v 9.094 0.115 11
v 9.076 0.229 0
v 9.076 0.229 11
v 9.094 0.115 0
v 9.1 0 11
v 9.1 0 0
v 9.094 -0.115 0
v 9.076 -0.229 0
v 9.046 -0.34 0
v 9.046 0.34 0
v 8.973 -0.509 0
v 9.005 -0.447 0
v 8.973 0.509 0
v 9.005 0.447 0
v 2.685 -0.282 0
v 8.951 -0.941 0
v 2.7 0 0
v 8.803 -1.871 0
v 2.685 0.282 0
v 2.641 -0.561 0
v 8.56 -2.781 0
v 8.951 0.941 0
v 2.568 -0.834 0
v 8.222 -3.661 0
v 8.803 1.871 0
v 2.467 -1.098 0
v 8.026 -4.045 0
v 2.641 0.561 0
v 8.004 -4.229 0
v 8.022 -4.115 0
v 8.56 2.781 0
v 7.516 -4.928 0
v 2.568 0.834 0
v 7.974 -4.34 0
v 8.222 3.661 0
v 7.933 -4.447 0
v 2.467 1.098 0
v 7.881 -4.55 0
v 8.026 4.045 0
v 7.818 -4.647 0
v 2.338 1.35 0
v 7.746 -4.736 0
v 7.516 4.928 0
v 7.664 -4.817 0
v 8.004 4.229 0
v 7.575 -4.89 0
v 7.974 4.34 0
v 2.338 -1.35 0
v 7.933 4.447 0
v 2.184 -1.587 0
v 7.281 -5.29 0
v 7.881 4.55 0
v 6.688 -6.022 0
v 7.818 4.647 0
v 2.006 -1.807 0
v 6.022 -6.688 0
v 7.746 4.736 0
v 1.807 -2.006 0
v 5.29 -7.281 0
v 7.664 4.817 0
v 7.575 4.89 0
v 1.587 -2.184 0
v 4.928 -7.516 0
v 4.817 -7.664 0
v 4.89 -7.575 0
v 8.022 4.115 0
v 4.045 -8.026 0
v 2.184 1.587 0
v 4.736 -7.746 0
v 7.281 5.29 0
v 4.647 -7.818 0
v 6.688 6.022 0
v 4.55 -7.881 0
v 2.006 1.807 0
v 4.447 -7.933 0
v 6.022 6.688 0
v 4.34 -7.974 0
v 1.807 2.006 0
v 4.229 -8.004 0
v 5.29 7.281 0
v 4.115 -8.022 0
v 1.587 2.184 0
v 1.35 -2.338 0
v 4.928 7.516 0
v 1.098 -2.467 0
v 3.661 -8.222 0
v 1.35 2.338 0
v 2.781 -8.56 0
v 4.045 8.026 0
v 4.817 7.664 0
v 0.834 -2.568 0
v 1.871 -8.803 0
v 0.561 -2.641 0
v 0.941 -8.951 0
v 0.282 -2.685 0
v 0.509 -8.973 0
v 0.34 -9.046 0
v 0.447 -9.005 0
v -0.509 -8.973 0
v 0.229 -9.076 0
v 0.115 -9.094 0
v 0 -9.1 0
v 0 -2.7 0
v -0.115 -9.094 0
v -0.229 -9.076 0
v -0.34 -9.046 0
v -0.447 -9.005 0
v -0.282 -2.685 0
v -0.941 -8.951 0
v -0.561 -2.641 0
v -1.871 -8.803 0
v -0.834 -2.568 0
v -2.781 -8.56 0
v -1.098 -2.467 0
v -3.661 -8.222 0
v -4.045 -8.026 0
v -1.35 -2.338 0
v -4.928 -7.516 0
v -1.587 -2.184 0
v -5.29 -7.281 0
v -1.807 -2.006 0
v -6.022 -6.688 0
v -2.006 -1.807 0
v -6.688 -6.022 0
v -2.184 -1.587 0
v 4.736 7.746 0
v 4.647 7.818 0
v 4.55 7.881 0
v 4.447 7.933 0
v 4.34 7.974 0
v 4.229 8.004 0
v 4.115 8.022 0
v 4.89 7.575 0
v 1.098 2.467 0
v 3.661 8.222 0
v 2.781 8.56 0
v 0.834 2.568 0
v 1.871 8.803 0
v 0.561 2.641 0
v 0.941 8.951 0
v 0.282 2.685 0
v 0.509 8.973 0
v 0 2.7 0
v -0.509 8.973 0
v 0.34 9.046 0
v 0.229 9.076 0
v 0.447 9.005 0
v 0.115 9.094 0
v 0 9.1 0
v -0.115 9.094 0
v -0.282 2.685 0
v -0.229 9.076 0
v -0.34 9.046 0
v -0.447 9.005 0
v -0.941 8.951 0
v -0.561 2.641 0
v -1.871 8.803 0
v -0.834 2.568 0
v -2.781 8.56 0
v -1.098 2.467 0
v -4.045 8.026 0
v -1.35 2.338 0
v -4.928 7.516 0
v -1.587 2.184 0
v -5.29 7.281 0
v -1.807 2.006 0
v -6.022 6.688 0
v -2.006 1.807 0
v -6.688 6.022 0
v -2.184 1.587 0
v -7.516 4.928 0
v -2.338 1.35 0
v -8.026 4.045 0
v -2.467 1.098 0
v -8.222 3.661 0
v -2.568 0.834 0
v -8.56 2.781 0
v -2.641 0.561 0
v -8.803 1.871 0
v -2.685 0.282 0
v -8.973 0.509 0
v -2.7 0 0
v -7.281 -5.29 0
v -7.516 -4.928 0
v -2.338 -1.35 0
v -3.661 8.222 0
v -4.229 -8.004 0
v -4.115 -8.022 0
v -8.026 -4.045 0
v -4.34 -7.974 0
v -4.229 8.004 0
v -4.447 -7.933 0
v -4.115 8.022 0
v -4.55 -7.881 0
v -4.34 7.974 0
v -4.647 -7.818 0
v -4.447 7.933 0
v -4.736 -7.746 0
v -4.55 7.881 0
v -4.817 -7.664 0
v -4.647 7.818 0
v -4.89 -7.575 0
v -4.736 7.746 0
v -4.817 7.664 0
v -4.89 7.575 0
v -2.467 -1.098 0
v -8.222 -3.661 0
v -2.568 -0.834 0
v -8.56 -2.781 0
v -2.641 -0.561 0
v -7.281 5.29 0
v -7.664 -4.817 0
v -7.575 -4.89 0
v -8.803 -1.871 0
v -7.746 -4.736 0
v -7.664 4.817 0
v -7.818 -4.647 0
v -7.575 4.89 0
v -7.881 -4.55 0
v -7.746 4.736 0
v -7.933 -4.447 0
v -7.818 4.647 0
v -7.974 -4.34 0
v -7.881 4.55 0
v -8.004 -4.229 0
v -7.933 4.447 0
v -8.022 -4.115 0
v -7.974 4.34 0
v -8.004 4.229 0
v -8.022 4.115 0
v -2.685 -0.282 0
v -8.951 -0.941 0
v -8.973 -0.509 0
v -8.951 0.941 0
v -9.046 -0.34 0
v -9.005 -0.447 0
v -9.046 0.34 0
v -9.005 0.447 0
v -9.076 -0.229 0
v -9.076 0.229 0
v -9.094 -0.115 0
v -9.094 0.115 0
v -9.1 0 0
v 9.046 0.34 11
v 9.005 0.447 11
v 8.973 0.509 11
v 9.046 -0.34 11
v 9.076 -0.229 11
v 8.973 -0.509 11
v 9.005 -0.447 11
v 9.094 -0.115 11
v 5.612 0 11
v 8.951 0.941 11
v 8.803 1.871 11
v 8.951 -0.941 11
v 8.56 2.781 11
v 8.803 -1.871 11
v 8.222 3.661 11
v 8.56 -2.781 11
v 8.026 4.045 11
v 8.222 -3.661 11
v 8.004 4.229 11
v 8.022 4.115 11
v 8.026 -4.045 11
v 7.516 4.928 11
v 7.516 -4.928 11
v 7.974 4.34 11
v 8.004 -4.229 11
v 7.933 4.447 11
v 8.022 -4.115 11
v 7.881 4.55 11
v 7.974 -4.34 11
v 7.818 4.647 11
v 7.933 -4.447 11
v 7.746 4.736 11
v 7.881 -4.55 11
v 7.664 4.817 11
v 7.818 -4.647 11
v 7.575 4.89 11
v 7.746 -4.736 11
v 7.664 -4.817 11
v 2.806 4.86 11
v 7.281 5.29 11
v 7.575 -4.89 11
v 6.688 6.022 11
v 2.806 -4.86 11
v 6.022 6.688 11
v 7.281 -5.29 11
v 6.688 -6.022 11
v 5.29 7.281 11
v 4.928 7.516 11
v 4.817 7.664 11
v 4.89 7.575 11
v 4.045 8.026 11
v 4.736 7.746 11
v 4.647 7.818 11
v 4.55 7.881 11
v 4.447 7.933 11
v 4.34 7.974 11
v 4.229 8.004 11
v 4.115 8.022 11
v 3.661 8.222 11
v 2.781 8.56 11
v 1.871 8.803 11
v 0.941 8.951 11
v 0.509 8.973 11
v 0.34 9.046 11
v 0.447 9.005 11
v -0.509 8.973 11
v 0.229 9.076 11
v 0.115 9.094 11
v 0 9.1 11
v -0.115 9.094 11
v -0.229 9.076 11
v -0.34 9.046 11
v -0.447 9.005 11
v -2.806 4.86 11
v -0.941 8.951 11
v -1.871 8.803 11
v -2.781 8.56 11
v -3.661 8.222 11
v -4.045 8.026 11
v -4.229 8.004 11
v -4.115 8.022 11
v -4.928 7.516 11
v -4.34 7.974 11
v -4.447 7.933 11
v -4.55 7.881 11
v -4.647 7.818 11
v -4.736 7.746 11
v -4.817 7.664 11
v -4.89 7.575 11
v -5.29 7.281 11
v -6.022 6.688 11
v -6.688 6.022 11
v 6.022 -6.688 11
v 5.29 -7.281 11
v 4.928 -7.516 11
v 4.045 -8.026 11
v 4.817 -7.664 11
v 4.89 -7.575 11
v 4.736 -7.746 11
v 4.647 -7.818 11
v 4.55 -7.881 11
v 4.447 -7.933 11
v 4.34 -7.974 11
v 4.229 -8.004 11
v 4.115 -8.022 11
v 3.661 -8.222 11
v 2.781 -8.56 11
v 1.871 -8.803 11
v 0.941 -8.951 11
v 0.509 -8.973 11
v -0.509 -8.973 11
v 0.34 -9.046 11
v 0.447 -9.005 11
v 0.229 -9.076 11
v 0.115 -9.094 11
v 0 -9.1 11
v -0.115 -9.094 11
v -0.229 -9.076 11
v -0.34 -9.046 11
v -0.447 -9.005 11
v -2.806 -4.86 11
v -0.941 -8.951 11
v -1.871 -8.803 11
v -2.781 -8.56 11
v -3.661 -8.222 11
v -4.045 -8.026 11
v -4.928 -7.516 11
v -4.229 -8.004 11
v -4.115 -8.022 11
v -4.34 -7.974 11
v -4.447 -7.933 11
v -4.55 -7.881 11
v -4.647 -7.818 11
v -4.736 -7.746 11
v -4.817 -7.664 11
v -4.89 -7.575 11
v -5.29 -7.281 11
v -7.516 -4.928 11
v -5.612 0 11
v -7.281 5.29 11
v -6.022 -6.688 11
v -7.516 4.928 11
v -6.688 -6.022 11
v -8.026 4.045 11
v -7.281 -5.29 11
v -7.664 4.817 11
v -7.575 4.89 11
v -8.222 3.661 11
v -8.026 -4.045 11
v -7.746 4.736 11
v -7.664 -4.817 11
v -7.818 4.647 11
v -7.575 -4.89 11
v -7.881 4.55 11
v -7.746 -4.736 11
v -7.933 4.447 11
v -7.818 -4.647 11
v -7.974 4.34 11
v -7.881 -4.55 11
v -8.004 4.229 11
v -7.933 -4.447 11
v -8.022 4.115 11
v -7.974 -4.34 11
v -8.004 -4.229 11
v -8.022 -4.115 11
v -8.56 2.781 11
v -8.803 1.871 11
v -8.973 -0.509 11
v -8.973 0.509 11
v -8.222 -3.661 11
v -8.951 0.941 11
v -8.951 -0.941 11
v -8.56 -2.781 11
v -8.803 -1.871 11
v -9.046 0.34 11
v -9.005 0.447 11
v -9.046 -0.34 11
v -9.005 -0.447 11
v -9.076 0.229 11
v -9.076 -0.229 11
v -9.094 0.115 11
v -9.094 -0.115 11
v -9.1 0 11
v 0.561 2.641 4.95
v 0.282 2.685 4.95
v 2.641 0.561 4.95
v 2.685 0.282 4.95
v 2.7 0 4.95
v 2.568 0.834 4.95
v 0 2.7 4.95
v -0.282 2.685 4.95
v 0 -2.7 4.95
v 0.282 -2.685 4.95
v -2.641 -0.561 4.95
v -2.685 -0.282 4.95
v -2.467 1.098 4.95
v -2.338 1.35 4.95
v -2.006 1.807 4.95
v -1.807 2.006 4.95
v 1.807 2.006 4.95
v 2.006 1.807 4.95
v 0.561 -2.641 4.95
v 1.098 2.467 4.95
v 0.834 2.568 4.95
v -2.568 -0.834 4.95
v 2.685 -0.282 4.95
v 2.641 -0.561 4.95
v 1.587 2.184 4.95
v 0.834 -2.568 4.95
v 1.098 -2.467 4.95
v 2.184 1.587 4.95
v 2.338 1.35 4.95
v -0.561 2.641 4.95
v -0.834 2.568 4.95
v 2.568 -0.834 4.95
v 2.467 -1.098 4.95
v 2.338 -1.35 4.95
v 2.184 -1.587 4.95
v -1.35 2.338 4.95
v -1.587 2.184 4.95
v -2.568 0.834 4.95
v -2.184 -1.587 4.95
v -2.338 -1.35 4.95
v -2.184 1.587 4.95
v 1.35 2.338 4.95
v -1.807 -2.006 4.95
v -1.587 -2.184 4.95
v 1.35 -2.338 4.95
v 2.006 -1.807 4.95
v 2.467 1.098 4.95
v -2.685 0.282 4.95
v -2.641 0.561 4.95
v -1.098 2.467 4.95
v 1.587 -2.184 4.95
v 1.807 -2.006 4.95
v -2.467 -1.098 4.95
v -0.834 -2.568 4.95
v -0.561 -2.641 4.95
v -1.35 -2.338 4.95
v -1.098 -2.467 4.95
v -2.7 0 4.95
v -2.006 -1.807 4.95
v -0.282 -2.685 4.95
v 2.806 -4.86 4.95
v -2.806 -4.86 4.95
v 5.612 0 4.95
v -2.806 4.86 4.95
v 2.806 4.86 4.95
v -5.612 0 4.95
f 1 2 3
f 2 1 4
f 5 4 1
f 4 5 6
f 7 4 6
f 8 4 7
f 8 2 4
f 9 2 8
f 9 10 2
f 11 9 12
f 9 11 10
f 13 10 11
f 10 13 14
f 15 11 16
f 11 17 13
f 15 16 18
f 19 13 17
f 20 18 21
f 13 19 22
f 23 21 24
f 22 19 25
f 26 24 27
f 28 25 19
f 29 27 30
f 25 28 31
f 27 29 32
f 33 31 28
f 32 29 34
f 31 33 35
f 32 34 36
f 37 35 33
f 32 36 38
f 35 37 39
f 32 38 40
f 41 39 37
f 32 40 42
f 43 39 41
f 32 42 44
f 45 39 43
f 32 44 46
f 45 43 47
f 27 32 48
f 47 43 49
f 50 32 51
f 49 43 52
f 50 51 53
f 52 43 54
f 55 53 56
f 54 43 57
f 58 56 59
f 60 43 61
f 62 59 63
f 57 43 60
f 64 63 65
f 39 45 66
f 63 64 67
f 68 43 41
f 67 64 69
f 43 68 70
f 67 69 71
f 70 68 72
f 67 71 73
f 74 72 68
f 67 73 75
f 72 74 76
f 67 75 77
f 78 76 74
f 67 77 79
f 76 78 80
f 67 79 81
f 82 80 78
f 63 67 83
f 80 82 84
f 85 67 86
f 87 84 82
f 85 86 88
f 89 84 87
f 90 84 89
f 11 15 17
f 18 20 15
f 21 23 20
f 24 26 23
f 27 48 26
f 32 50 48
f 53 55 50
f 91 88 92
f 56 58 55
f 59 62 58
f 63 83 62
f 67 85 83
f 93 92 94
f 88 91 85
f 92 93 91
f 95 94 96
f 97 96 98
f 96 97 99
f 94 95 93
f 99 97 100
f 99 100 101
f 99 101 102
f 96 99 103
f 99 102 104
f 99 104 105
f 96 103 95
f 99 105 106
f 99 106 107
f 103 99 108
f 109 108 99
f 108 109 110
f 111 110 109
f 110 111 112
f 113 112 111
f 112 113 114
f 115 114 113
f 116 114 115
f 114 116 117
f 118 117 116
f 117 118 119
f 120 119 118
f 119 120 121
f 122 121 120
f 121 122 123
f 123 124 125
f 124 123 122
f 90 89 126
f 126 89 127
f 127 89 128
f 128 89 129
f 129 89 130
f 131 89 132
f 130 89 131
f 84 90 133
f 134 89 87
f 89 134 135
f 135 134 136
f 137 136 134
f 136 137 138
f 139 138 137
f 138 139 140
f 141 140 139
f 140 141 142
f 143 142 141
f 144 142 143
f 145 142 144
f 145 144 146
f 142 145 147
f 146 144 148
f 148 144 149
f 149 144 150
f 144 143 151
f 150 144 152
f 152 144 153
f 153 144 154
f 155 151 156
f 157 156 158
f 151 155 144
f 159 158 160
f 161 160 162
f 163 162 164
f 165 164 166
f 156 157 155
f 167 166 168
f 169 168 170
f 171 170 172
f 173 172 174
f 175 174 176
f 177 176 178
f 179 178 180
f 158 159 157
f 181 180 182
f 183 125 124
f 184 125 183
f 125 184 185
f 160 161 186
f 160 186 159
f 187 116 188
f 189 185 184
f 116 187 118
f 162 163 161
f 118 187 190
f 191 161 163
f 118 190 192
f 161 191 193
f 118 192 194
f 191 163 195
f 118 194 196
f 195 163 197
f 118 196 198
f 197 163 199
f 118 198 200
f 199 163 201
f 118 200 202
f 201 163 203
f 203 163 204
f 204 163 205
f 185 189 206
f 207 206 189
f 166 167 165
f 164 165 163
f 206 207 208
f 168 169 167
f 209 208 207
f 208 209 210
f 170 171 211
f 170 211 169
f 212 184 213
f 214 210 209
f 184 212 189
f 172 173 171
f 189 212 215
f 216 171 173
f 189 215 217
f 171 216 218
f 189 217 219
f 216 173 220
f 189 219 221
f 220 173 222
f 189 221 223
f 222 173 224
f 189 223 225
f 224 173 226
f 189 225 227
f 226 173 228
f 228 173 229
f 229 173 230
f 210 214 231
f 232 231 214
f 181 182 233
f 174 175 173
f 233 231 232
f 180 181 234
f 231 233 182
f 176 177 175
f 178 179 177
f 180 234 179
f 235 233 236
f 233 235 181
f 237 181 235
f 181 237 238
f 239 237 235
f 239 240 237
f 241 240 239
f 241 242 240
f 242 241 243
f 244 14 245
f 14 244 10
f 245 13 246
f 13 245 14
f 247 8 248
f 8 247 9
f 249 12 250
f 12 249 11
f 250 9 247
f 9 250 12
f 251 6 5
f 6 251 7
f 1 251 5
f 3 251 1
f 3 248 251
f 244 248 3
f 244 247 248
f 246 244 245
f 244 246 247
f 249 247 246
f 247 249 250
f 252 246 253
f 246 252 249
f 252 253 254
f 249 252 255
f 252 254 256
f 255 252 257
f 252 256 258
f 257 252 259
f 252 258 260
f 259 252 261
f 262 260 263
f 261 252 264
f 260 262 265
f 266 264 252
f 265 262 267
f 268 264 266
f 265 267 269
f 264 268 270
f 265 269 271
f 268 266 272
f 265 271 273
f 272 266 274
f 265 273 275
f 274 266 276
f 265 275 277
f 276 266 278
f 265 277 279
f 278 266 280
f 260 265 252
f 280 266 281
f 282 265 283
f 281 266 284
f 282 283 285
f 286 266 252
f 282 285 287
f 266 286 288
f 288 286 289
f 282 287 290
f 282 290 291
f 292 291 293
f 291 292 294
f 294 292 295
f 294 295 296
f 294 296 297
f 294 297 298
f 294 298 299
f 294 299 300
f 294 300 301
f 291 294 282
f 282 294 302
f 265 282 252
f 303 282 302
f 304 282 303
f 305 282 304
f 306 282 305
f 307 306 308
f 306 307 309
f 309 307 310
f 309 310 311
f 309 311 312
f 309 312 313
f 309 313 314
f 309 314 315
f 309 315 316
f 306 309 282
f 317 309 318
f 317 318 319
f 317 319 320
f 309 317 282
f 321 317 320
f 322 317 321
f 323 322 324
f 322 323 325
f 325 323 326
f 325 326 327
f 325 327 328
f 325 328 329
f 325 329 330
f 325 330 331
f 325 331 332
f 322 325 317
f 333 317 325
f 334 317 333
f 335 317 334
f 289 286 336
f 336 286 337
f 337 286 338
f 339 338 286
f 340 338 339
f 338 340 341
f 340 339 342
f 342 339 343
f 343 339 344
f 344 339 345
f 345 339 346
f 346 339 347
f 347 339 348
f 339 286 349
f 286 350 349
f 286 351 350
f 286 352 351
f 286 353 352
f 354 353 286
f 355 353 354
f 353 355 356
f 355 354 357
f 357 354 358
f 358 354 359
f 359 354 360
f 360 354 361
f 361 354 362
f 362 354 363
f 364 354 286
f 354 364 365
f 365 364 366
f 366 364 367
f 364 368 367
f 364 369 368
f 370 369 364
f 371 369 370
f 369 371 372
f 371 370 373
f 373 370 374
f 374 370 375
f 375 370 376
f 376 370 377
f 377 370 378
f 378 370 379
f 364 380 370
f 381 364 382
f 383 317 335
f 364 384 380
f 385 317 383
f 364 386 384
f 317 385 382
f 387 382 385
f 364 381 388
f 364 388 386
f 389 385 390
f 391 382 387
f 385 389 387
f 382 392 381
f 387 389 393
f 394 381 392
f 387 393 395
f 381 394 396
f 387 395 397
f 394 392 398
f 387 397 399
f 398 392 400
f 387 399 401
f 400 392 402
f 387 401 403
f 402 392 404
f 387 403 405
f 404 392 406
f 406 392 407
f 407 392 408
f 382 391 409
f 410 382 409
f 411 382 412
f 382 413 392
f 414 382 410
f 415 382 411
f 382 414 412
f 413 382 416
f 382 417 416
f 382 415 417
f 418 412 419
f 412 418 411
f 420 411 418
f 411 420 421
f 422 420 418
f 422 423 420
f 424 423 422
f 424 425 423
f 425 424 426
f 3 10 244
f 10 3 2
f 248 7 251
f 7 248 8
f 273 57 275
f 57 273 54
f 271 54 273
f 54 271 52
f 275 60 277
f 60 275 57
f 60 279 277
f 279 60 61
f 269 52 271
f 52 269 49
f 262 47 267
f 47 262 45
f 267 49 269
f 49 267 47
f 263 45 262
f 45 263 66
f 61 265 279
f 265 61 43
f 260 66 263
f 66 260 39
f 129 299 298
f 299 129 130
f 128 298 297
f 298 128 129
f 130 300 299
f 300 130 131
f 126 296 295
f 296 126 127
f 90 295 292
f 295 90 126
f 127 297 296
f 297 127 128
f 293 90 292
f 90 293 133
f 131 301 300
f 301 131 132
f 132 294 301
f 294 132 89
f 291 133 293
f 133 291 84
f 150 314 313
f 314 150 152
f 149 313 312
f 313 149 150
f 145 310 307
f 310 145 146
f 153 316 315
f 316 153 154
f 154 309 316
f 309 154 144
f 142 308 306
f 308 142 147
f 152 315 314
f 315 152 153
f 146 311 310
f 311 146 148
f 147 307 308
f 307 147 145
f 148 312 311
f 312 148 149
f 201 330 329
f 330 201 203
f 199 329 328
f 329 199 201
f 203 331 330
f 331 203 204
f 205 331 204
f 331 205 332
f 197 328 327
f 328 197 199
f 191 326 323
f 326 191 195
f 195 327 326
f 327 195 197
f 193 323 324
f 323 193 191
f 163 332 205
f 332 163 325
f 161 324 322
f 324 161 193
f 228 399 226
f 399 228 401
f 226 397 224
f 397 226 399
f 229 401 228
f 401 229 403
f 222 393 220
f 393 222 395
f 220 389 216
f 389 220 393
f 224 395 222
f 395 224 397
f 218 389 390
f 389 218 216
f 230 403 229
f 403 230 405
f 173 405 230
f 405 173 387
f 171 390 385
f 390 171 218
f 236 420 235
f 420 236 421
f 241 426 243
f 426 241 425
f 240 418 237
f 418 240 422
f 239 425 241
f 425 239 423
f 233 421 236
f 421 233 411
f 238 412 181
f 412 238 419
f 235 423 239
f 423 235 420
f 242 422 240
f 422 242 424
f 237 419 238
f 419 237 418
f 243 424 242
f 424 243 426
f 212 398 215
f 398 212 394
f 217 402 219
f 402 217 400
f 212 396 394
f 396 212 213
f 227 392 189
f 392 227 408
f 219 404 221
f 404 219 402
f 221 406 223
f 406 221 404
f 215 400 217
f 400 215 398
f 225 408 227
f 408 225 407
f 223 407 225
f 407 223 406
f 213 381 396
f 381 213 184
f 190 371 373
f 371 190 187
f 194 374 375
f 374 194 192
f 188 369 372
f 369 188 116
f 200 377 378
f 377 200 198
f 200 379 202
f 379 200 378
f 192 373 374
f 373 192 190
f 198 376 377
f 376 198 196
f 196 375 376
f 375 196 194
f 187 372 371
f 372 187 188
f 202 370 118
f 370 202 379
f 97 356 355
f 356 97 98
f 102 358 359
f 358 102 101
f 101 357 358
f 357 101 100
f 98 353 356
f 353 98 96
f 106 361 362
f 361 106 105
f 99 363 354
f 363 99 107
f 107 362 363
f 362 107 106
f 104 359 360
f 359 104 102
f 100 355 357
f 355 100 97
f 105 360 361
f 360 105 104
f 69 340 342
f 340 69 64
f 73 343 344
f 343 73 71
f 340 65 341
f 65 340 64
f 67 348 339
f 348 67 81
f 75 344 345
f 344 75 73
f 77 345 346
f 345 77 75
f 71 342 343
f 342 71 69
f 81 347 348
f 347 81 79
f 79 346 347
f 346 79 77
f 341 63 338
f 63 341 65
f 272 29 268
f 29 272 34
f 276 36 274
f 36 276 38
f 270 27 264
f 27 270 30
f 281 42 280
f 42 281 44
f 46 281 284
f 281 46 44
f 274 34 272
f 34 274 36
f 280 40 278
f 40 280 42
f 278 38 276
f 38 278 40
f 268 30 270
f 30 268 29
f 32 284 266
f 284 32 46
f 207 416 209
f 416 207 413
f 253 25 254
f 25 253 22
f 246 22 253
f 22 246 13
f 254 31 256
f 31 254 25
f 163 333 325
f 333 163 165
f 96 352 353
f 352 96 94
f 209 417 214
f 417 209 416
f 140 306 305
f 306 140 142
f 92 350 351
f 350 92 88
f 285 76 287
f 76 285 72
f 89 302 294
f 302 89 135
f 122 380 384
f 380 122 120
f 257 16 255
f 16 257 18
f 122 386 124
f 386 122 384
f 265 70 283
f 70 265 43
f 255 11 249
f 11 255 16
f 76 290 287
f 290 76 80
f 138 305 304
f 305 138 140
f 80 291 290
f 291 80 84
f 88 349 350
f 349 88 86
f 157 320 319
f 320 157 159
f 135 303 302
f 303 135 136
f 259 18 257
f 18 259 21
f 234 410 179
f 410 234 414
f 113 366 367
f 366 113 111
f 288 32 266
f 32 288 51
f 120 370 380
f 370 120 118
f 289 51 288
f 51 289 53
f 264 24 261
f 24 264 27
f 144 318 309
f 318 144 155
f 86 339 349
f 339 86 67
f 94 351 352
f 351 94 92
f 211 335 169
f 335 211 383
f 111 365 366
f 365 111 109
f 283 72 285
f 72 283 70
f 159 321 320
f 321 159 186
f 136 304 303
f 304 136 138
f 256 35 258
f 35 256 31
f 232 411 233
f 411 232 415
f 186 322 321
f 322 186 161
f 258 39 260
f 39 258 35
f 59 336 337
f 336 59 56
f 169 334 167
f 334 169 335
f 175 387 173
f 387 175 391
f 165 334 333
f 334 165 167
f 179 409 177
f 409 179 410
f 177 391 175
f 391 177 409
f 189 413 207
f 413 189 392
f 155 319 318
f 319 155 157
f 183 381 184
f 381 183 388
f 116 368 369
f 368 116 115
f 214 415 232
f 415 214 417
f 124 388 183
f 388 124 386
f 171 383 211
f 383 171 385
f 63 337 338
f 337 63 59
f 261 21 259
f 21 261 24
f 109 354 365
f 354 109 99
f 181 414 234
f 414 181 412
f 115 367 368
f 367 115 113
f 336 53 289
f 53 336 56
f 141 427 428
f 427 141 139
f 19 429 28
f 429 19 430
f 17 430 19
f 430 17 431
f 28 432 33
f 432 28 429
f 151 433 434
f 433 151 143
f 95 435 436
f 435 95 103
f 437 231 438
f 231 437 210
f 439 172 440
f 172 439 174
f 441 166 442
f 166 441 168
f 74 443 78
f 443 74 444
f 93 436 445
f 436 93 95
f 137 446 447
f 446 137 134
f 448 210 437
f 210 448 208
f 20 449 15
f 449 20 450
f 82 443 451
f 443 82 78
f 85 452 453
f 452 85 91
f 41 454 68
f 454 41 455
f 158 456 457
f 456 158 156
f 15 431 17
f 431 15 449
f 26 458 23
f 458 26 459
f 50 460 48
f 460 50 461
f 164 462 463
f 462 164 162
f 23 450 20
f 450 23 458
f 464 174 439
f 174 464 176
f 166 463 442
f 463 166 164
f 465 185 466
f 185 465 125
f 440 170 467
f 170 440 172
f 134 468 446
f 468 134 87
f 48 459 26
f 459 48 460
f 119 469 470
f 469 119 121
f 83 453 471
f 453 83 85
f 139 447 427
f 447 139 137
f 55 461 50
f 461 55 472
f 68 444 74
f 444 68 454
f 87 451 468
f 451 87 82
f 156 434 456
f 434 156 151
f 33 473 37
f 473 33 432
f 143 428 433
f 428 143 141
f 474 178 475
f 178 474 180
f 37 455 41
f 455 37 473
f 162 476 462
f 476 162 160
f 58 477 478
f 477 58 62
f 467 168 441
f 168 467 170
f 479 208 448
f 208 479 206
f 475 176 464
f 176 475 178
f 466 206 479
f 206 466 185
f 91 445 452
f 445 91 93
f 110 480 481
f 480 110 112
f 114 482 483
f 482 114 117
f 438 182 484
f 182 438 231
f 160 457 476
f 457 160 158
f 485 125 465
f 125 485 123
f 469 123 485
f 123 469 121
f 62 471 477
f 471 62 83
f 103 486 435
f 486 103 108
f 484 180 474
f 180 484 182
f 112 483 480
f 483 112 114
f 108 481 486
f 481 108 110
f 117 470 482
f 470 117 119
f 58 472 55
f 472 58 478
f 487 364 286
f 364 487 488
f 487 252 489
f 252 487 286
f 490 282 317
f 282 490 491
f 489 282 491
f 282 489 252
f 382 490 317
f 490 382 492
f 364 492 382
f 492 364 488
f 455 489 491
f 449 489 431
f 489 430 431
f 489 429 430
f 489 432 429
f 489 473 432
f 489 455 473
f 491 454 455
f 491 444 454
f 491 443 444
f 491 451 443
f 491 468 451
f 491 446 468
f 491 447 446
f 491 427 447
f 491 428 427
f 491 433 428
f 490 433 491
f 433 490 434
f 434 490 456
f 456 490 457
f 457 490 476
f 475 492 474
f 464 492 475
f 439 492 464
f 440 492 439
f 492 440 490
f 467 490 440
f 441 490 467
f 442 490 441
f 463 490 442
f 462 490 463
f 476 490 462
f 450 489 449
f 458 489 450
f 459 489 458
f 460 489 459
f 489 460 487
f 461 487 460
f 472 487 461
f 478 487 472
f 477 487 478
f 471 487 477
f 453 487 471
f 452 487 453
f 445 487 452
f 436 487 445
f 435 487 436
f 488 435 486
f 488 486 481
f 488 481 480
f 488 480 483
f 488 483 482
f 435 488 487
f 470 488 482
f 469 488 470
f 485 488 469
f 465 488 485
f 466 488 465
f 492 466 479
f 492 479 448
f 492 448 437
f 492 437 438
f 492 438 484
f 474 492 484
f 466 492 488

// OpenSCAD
// Knurled-style thumb knob with hex socket.
$fn = 60;
eps = 0.02;
thread_d = 5.4;
knob_d = 18;
knob_h = 11;
socket_flat = thread_d * 1.8;
difference() {
    union() {
        cylinder(d = knob_d, h = knob_h);
        for (i = [0 : 11]) rotate([0, 0, i * 30]) translate([knob_d / 2 - 1, 0, 0]) cylinder(d = 2.2, h = knob_h);
    }
    translate([0, 0, -eps]) cylinder(d = thread_d, h = knob_h + 2 * eps);
    translate([0, 0, knob_h - knob_h * 0.55]) cylinder(d = socket_flat / cos(30), h = knob_h * 0.55 + eps, $fn = 6);
}
